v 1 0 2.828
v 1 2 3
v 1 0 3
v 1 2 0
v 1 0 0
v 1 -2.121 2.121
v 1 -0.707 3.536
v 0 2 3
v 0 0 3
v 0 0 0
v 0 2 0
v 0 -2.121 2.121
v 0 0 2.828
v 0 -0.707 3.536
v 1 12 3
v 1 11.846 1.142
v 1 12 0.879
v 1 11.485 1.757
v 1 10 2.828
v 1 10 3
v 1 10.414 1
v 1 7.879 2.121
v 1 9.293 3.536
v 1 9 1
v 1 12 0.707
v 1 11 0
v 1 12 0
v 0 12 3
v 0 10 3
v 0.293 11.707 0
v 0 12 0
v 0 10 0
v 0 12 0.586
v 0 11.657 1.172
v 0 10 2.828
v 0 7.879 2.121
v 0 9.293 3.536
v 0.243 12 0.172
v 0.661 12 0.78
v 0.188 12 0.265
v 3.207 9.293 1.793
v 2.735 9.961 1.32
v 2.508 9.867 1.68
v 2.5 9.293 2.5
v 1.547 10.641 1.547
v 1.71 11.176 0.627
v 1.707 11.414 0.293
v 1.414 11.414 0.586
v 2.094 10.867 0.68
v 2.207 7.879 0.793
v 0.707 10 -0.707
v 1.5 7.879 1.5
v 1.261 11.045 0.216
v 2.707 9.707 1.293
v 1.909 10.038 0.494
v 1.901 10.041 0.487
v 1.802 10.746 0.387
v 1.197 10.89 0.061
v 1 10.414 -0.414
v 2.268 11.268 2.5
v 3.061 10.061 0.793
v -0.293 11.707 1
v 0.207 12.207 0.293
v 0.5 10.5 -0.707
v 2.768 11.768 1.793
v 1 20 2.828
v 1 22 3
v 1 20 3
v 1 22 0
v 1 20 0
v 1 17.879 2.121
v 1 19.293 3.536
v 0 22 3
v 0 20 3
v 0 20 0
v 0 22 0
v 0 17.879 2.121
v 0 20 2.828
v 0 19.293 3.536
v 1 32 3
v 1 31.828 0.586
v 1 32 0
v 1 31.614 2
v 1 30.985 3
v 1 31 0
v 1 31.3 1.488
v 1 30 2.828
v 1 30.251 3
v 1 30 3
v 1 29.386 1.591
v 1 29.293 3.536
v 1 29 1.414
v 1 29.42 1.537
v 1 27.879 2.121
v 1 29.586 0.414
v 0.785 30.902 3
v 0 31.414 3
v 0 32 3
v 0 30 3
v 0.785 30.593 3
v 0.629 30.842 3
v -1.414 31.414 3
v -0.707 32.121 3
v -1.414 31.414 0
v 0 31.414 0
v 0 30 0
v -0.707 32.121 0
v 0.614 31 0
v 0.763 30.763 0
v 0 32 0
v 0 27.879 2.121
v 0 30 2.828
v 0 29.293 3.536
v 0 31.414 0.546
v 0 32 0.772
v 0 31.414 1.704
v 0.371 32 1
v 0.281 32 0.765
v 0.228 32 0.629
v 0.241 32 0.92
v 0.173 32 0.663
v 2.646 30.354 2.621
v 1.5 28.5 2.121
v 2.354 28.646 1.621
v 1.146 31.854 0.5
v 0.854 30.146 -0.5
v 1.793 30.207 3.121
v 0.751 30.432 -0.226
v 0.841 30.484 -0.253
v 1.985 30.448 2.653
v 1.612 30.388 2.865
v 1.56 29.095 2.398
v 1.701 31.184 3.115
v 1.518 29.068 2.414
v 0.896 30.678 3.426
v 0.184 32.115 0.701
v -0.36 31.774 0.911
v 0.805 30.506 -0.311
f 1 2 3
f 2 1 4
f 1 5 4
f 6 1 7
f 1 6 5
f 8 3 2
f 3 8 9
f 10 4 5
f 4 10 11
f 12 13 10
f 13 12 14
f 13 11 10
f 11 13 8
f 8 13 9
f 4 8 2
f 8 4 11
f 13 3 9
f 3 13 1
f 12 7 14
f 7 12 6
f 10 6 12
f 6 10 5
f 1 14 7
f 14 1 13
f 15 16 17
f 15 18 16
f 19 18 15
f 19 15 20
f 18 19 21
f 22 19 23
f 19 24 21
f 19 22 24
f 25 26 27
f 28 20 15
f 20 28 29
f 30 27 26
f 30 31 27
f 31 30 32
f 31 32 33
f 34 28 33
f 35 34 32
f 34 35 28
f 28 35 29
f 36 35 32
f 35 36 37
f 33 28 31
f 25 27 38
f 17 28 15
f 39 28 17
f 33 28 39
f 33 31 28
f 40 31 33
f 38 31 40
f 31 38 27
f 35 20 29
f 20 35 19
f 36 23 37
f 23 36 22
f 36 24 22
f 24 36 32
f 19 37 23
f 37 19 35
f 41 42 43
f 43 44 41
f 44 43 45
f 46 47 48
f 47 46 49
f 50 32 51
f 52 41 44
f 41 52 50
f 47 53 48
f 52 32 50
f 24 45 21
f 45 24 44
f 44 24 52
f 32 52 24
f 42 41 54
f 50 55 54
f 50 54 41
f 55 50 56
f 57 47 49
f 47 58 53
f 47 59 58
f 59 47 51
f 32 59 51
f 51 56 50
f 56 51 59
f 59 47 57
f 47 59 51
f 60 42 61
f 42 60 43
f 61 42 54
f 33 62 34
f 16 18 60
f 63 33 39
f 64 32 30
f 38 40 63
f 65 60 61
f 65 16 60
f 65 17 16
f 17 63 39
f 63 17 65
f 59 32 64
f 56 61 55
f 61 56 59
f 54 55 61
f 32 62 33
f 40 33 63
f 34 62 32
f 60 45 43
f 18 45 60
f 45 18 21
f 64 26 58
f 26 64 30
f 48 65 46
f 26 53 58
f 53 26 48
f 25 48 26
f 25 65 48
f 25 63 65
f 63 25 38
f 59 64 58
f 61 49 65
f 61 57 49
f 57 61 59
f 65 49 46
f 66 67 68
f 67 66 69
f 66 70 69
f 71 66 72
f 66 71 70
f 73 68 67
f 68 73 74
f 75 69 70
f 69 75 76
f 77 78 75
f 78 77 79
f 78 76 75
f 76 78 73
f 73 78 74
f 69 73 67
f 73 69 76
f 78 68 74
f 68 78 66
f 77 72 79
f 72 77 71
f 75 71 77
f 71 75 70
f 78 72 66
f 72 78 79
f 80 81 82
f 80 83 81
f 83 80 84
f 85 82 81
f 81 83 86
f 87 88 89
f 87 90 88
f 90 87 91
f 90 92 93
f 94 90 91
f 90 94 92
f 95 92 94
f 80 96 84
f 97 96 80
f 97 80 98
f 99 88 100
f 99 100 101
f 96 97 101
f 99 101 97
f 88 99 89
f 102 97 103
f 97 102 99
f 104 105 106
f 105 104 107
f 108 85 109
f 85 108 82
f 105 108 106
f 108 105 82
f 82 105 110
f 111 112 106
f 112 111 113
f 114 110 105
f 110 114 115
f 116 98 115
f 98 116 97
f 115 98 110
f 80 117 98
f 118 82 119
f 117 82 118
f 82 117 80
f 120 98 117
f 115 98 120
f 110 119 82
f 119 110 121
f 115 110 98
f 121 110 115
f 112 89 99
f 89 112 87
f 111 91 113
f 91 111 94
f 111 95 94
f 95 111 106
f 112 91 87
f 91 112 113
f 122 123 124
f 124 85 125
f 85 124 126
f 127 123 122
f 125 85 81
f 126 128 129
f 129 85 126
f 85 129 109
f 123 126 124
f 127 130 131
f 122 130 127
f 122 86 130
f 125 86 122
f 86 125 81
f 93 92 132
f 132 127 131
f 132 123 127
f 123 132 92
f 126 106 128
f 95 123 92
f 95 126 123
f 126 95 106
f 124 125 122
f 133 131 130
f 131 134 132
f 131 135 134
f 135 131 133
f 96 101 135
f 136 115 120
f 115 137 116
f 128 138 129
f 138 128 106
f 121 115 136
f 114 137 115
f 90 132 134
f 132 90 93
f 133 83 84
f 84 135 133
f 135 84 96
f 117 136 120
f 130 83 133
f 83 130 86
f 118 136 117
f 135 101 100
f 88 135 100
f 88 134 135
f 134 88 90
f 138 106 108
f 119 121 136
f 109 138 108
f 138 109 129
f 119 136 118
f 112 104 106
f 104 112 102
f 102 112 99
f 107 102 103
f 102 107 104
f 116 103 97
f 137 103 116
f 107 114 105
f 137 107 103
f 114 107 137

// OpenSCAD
color("red")
translate([0,0]){
    rotate([""])
    cube([1,2,3]);
    rotate([45])
    cube([1,2,3]);
    rotate([45,""])
    cube([1,2,3]);
    rotate([45,"",""])
    cube([1,2,3]);
    rotate([45,"","",""])
    cube([1,2,3]);
}


color("green")
translate([0,10]){
    rotate([])
    cube([1,2,3]);
    rotate([45])
    cube([1,2,3]);
    rotate([45,45])
    cube([1,2,3]);
    rotate([45,45,45])
    cube([1,2,3]);
    rotate([45,45,45,45])
    cube([1,2,3]);
}

color("blue")
translate([0,20]){
    rotate([0])
    cube([1,2,3]);
    rotate([45])
    cube([1,2,3]);
    rotate([45,0])
    cube([1,2,3]);
    rotate([45,0,0])
    cube([1,2,3]);
    rotate([45,0,0,0])
    cube([1,2,3]);
}

color("yellow")
translate([0,30]){
    rotate([])
    cube([1,2,3]);
    rotate(45,[1,0])
    cube([1,2,3]);
    rotate(45,[1,1])
    cube([1,2,3]);
    rotate(45,[1,1,1])
    cube([1,2,3]);
    rotate(45,[1,0,1,0])
    cube([1,2,3]);
}
